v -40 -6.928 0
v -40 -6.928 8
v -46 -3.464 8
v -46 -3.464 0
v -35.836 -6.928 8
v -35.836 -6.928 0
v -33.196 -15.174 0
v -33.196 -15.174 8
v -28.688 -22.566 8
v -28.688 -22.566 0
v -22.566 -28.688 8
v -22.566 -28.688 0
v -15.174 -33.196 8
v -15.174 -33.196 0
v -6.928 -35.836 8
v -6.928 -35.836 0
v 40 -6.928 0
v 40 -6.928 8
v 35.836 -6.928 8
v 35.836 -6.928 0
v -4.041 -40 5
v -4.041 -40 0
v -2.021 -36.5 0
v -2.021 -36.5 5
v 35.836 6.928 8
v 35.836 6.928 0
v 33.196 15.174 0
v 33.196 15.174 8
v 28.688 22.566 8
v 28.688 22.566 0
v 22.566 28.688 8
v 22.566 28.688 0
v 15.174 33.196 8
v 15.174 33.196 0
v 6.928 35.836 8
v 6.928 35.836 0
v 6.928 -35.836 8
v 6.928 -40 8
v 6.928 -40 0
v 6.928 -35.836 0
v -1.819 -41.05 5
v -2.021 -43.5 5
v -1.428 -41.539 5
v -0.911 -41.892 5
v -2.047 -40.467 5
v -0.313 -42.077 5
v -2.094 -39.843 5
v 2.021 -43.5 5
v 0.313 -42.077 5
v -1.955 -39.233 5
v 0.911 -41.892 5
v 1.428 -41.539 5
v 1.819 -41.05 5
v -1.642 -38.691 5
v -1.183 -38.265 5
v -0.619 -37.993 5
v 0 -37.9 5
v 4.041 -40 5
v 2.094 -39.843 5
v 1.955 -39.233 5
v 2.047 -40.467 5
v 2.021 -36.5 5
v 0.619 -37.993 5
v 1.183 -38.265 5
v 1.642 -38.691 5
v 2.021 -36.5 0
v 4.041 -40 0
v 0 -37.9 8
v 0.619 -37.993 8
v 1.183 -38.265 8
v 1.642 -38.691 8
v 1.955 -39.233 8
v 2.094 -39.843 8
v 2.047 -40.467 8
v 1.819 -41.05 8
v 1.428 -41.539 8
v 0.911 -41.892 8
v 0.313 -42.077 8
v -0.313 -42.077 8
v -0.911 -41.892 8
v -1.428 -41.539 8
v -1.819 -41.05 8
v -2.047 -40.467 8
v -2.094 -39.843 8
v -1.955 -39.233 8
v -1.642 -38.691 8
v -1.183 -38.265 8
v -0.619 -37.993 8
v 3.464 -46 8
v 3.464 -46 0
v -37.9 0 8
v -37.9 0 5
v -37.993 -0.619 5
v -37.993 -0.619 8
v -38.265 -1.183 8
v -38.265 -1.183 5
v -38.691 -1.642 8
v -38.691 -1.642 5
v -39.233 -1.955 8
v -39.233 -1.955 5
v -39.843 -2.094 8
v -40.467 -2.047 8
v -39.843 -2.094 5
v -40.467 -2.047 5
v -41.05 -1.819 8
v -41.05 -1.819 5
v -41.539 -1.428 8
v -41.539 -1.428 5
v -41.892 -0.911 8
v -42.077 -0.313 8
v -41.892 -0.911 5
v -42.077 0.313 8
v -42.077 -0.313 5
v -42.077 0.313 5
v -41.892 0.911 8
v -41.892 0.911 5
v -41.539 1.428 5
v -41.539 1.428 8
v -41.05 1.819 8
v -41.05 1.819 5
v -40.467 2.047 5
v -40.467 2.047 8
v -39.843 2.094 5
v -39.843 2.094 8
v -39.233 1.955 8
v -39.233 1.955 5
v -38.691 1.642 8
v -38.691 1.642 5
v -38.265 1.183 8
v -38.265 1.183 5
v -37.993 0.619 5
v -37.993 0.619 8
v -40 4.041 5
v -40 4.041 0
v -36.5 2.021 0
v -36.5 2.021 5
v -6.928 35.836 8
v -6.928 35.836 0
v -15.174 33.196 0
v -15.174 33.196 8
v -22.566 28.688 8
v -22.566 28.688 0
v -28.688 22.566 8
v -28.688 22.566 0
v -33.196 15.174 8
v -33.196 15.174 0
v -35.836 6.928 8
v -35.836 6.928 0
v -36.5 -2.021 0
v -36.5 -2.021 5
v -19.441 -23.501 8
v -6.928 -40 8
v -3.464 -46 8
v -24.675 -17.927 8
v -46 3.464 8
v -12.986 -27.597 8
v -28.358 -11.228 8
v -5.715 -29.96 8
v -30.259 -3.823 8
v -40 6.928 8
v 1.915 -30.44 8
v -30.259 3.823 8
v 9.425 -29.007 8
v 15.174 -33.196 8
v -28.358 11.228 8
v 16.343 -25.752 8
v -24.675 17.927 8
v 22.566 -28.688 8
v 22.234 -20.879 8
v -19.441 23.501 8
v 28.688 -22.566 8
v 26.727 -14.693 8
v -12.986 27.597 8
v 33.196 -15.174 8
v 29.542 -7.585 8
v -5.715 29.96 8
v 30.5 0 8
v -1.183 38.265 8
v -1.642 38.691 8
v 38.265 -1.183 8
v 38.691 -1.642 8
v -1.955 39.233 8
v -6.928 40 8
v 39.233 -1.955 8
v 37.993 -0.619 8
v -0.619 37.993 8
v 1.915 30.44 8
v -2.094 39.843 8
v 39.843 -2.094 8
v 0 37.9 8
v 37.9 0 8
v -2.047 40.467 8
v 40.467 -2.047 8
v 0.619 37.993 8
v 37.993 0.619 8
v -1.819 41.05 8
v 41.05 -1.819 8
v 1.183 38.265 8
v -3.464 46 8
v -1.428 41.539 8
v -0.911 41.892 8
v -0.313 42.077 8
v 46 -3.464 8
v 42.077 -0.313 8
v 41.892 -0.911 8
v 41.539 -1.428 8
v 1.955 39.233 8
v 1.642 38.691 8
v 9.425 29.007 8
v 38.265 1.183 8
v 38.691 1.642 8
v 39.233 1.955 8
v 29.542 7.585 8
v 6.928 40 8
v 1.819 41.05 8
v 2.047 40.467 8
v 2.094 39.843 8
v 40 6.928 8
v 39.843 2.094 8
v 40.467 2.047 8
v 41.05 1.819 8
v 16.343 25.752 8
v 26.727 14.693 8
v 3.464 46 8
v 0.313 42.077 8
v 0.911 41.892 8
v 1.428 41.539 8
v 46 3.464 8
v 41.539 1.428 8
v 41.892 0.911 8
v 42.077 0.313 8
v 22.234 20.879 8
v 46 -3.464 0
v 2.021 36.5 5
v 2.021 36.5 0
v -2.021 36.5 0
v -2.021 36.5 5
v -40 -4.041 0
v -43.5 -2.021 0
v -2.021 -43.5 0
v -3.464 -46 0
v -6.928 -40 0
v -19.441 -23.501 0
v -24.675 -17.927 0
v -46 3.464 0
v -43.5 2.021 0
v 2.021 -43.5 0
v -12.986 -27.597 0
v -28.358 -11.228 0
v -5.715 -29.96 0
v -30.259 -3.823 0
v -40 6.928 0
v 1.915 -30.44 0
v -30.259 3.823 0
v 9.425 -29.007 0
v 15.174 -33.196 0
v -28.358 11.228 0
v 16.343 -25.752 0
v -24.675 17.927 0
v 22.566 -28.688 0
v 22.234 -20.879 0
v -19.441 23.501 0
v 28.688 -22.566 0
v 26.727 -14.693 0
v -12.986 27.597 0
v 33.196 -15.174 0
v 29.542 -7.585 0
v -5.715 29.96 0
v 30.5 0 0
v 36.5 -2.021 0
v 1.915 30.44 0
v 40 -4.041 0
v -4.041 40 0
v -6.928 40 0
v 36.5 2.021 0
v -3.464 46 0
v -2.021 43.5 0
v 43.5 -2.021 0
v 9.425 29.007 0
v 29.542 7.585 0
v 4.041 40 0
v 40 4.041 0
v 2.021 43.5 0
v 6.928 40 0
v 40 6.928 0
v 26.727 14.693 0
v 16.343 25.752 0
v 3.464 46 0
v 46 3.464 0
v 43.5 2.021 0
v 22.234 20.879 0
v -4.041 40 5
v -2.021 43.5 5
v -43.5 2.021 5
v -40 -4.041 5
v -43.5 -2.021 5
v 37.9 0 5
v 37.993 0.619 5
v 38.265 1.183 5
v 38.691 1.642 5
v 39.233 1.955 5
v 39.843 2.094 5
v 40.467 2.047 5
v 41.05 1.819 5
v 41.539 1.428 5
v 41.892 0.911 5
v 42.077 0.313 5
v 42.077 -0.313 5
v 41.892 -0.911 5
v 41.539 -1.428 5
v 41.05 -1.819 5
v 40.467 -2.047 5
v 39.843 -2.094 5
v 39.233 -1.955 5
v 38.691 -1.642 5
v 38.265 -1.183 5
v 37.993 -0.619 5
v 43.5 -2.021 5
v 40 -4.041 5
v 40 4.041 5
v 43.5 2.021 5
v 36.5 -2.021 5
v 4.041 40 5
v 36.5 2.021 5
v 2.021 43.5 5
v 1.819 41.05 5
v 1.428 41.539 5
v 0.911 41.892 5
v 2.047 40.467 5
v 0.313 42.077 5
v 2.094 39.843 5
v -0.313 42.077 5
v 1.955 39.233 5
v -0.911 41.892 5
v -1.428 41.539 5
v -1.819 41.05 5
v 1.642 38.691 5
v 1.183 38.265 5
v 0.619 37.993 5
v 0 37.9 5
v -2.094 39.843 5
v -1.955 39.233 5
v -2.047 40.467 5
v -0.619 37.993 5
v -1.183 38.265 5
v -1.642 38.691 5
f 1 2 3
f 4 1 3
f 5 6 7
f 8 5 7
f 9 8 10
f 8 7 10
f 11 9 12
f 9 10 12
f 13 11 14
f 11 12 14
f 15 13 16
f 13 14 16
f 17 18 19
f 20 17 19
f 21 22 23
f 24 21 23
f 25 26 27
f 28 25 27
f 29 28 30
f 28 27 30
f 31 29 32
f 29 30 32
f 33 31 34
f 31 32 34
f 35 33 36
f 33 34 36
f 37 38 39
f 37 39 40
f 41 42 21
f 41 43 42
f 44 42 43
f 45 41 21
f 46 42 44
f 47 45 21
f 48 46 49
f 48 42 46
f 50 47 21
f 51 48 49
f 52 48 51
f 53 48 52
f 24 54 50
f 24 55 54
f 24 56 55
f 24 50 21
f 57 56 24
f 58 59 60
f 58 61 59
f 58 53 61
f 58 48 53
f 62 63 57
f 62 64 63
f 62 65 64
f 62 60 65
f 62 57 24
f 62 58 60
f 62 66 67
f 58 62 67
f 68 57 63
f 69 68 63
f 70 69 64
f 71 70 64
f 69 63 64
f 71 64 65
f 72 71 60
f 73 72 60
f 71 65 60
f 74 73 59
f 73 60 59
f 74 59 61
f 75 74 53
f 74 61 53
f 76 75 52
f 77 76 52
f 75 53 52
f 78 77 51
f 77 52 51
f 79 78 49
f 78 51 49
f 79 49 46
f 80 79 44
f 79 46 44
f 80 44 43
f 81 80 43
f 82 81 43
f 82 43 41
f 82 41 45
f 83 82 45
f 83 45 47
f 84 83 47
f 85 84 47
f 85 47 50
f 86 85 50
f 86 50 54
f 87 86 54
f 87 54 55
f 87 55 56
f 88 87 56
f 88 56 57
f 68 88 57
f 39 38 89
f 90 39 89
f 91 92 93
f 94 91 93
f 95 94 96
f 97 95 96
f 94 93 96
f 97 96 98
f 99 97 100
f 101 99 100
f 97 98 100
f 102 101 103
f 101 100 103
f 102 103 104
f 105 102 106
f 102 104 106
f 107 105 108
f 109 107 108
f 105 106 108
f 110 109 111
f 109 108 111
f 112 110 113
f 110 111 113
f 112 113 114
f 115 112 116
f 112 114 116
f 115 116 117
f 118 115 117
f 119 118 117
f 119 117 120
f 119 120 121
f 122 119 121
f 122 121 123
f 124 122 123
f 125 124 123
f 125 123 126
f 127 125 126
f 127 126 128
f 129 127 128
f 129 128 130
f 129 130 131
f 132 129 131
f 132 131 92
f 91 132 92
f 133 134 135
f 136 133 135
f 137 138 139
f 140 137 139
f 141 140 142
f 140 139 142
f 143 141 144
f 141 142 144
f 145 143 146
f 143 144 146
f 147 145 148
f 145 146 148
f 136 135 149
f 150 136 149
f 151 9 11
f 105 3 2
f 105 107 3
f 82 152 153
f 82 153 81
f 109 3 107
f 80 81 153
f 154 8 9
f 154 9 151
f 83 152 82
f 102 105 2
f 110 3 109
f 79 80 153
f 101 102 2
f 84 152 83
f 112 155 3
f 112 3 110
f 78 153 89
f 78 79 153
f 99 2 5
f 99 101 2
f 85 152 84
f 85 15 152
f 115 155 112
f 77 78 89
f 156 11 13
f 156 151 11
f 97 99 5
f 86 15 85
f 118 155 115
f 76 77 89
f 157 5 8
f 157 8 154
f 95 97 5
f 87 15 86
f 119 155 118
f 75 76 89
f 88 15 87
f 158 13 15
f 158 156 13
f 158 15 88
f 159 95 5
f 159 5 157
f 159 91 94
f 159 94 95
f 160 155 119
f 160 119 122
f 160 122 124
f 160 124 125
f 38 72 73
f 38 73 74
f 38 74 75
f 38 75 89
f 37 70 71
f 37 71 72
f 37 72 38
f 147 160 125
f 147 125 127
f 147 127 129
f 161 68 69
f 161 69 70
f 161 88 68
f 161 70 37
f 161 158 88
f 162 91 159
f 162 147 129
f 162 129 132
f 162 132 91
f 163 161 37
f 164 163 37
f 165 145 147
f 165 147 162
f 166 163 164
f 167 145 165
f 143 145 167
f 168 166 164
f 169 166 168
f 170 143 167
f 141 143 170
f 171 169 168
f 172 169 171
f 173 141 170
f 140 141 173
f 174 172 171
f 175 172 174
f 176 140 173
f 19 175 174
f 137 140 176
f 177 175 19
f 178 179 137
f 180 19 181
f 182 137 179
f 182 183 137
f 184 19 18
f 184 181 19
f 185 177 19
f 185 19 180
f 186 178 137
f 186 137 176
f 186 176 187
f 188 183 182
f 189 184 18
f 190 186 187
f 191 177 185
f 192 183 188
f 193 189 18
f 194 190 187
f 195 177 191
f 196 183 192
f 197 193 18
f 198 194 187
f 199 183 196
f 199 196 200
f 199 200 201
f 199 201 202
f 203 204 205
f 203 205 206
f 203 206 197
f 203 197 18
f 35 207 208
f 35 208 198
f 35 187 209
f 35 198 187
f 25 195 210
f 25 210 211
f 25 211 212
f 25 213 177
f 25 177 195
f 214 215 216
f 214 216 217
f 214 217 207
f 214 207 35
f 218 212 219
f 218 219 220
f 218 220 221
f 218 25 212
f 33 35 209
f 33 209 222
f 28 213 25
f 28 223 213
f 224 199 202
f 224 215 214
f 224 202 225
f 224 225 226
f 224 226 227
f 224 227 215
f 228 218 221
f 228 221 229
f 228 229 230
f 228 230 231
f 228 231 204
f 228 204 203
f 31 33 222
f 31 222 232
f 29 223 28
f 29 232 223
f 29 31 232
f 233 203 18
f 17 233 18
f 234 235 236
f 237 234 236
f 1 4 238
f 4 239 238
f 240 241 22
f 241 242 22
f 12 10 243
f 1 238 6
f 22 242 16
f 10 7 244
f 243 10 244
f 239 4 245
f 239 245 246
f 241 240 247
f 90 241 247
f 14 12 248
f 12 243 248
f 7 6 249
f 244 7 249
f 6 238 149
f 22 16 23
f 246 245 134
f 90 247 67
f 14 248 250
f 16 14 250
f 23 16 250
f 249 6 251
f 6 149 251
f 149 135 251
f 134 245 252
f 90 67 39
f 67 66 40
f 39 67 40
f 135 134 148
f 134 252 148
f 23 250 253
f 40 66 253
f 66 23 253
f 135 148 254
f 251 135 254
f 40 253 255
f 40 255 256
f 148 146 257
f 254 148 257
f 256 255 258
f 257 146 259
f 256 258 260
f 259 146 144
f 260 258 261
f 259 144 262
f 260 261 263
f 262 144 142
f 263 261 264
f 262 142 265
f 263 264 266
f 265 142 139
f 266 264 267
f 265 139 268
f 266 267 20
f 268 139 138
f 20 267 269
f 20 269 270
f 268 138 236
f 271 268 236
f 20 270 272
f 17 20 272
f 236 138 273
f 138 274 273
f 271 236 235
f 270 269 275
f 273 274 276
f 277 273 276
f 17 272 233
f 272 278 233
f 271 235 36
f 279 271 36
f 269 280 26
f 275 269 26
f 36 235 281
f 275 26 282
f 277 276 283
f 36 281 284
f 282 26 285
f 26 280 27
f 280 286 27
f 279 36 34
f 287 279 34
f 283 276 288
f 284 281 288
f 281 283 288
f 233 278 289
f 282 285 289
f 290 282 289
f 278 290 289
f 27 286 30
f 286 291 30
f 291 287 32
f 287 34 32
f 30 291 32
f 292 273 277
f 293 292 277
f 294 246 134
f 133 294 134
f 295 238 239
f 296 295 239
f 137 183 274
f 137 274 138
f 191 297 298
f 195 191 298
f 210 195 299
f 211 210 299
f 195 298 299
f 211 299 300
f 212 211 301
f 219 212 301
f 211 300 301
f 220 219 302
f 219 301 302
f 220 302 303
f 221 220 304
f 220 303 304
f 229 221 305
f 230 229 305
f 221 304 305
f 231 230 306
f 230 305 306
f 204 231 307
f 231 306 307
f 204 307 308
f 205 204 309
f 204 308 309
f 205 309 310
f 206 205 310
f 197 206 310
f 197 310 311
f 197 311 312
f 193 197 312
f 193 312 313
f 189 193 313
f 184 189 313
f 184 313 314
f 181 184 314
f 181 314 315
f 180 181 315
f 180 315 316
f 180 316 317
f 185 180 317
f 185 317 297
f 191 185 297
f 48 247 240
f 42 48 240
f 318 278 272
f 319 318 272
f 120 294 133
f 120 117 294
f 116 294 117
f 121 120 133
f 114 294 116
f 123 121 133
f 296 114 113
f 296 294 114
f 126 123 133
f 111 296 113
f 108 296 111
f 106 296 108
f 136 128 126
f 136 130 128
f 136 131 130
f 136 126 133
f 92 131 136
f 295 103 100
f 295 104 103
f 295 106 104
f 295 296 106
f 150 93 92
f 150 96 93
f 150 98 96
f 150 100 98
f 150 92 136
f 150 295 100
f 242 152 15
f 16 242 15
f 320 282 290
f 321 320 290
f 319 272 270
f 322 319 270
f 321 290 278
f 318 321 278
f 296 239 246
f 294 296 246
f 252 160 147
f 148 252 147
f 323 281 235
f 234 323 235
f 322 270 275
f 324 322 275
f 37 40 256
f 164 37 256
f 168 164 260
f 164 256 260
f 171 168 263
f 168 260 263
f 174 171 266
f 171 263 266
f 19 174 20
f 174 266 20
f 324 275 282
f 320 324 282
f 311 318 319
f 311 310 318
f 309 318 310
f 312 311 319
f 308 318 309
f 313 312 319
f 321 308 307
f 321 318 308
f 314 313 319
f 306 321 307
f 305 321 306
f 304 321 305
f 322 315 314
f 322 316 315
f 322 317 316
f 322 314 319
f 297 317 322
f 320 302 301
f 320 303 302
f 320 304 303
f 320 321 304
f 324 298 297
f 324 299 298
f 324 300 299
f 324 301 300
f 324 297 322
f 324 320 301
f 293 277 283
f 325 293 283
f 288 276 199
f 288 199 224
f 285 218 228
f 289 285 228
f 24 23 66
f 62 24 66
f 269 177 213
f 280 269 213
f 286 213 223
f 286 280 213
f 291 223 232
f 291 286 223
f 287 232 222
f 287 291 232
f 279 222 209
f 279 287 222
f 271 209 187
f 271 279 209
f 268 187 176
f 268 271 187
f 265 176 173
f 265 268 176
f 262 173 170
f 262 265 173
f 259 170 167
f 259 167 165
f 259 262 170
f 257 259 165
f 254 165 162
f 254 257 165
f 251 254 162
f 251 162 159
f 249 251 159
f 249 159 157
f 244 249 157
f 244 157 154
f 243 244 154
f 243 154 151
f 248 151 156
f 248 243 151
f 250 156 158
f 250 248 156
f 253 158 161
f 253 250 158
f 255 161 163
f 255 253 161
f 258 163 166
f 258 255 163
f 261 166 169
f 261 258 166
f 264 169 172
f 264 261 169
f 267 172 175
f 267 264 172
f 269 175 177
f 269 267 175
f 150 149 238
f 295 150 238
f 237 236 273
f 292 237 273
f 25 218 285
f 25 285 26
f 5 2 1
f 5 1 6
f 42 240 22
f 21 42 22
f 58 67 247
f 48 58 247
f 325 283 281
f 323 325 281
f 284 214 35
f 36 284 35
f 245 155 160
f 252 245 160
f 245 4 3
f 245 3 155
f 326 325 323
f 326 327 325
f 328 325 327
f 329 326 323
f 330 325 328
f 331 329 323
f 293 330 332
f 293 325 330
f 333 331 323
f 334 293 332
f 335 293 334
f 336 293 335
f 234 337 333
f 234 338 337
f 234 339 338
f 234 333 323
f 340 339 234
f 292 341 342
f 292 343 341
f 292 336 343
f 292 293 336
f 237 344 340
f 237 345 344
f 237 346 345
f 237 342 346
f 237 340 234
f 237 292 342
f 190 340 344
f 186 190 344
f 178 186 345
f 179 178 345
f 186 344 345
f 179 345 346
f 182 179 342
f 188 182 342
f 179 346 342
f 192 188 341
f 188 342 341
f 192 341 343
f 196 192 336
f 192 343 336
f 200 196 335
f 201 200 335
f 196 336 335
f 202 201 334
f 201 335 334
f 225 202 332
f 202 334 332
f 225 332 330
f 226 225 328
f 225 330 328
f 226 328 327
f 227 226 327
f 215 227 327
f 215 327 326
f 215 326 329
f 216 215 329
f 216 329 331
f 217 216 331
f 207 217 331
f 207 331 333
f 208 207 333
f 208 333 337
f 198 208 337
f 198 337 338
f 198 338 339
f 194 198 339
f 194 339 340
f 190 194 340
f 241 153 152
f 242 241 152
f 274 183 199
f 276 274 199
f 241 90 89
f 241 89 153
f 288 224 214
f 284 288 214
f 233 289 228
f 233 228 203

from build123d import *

# Parameters (mm, degrees)
SKETCH_R              = 36.5
SKETCH_R_2            = 30.5
PAD_DEPTH             = 8
SKETCH002_R           = 2.1
PAD001_DEPTH          = 8
POLARPATTERN_COUNT    = 4
POCKET001_DEPTH       = 5
POLARPATTERN001_COUNT = 4


with BuildPart() as part:
    # Sketch → Pad (new body)
    with BuildSketch(Plane.XY):
        Circle(SKETCH_R)
        Circle(SKETCH_R_2, mode=Mode.SUBTRACT)
    extrude(amount=PAD_DEPTH)

    # Sketch002 (on Face3 of Pad) → Pad001 (join)
    with BuildSketch(Plane(origin=(0, 0, 0), x_dir=(1, 0, 0), z_dir=(0, 0, -1))):
        with BuildLine():
            Line((-40, 6.928203), (-46, 3.464102))
            Line((-46, 3.464102), (-46, -3.464102))
            Line((-46, -3.464102), (-40, -6.928203))
            Line((-40, -6.928203), (-35.836434, -6.928203))
            ThreePointArc((-35.836434, 6.928203), (-36.5, 0), (-35.836434, -6.928203))
            Line((-40, 6.928203), (-35.836434, 6.928203))
        make_face()
        with Locations((-40, 0)):
            Circle(SKETCH002_R, mode=Mode.SUBTRACT)
    pad001 = extrude(amount=-PAD001_DEPTH)

    # PolarPattern: Pad001 ×4 about axis
    polarpattern_axis = Axis((0, 0, 0), (0, 0, -1))
    for i in range(1, POLARPATTERN_COUNT):
        add(pad001.rotate(polarpattern_axis, i * 360 / POLARPATTERN_COUNT))

    # Sketch003 (on Face2 of PolarPattern) → Pocket001 (cut)
    with BuildSketch(Plane(origin=(0, 0, 0), x_dir=(1, 0, 0), z_dir=(0, 0, -1))):
        Polygon((-36.5, 2.020726), (-40, 4.041452), (-43.5, 2.020726), (-43.5, -2.020726), (-40, -4.041452), (-36.5, -2.020726), align=None)
    pocket001 = extrude(amount=-POCKET001_DEPTH, mode=Mode.SUBTRACT)

    # PolarPattern001: Pocket001 ×4 about axis
    polarpattern001_axis = Axis((0, 0, 0), (0, 0, -1))
    for i in range(1, POLARPATTERN001_COUNT):
        add(pocket001.rotate(polarpattern001_axis, i * 360 / POLARPATTERN001_COUNT), mode=Mode.SUBTRACT)


solid = part.part
